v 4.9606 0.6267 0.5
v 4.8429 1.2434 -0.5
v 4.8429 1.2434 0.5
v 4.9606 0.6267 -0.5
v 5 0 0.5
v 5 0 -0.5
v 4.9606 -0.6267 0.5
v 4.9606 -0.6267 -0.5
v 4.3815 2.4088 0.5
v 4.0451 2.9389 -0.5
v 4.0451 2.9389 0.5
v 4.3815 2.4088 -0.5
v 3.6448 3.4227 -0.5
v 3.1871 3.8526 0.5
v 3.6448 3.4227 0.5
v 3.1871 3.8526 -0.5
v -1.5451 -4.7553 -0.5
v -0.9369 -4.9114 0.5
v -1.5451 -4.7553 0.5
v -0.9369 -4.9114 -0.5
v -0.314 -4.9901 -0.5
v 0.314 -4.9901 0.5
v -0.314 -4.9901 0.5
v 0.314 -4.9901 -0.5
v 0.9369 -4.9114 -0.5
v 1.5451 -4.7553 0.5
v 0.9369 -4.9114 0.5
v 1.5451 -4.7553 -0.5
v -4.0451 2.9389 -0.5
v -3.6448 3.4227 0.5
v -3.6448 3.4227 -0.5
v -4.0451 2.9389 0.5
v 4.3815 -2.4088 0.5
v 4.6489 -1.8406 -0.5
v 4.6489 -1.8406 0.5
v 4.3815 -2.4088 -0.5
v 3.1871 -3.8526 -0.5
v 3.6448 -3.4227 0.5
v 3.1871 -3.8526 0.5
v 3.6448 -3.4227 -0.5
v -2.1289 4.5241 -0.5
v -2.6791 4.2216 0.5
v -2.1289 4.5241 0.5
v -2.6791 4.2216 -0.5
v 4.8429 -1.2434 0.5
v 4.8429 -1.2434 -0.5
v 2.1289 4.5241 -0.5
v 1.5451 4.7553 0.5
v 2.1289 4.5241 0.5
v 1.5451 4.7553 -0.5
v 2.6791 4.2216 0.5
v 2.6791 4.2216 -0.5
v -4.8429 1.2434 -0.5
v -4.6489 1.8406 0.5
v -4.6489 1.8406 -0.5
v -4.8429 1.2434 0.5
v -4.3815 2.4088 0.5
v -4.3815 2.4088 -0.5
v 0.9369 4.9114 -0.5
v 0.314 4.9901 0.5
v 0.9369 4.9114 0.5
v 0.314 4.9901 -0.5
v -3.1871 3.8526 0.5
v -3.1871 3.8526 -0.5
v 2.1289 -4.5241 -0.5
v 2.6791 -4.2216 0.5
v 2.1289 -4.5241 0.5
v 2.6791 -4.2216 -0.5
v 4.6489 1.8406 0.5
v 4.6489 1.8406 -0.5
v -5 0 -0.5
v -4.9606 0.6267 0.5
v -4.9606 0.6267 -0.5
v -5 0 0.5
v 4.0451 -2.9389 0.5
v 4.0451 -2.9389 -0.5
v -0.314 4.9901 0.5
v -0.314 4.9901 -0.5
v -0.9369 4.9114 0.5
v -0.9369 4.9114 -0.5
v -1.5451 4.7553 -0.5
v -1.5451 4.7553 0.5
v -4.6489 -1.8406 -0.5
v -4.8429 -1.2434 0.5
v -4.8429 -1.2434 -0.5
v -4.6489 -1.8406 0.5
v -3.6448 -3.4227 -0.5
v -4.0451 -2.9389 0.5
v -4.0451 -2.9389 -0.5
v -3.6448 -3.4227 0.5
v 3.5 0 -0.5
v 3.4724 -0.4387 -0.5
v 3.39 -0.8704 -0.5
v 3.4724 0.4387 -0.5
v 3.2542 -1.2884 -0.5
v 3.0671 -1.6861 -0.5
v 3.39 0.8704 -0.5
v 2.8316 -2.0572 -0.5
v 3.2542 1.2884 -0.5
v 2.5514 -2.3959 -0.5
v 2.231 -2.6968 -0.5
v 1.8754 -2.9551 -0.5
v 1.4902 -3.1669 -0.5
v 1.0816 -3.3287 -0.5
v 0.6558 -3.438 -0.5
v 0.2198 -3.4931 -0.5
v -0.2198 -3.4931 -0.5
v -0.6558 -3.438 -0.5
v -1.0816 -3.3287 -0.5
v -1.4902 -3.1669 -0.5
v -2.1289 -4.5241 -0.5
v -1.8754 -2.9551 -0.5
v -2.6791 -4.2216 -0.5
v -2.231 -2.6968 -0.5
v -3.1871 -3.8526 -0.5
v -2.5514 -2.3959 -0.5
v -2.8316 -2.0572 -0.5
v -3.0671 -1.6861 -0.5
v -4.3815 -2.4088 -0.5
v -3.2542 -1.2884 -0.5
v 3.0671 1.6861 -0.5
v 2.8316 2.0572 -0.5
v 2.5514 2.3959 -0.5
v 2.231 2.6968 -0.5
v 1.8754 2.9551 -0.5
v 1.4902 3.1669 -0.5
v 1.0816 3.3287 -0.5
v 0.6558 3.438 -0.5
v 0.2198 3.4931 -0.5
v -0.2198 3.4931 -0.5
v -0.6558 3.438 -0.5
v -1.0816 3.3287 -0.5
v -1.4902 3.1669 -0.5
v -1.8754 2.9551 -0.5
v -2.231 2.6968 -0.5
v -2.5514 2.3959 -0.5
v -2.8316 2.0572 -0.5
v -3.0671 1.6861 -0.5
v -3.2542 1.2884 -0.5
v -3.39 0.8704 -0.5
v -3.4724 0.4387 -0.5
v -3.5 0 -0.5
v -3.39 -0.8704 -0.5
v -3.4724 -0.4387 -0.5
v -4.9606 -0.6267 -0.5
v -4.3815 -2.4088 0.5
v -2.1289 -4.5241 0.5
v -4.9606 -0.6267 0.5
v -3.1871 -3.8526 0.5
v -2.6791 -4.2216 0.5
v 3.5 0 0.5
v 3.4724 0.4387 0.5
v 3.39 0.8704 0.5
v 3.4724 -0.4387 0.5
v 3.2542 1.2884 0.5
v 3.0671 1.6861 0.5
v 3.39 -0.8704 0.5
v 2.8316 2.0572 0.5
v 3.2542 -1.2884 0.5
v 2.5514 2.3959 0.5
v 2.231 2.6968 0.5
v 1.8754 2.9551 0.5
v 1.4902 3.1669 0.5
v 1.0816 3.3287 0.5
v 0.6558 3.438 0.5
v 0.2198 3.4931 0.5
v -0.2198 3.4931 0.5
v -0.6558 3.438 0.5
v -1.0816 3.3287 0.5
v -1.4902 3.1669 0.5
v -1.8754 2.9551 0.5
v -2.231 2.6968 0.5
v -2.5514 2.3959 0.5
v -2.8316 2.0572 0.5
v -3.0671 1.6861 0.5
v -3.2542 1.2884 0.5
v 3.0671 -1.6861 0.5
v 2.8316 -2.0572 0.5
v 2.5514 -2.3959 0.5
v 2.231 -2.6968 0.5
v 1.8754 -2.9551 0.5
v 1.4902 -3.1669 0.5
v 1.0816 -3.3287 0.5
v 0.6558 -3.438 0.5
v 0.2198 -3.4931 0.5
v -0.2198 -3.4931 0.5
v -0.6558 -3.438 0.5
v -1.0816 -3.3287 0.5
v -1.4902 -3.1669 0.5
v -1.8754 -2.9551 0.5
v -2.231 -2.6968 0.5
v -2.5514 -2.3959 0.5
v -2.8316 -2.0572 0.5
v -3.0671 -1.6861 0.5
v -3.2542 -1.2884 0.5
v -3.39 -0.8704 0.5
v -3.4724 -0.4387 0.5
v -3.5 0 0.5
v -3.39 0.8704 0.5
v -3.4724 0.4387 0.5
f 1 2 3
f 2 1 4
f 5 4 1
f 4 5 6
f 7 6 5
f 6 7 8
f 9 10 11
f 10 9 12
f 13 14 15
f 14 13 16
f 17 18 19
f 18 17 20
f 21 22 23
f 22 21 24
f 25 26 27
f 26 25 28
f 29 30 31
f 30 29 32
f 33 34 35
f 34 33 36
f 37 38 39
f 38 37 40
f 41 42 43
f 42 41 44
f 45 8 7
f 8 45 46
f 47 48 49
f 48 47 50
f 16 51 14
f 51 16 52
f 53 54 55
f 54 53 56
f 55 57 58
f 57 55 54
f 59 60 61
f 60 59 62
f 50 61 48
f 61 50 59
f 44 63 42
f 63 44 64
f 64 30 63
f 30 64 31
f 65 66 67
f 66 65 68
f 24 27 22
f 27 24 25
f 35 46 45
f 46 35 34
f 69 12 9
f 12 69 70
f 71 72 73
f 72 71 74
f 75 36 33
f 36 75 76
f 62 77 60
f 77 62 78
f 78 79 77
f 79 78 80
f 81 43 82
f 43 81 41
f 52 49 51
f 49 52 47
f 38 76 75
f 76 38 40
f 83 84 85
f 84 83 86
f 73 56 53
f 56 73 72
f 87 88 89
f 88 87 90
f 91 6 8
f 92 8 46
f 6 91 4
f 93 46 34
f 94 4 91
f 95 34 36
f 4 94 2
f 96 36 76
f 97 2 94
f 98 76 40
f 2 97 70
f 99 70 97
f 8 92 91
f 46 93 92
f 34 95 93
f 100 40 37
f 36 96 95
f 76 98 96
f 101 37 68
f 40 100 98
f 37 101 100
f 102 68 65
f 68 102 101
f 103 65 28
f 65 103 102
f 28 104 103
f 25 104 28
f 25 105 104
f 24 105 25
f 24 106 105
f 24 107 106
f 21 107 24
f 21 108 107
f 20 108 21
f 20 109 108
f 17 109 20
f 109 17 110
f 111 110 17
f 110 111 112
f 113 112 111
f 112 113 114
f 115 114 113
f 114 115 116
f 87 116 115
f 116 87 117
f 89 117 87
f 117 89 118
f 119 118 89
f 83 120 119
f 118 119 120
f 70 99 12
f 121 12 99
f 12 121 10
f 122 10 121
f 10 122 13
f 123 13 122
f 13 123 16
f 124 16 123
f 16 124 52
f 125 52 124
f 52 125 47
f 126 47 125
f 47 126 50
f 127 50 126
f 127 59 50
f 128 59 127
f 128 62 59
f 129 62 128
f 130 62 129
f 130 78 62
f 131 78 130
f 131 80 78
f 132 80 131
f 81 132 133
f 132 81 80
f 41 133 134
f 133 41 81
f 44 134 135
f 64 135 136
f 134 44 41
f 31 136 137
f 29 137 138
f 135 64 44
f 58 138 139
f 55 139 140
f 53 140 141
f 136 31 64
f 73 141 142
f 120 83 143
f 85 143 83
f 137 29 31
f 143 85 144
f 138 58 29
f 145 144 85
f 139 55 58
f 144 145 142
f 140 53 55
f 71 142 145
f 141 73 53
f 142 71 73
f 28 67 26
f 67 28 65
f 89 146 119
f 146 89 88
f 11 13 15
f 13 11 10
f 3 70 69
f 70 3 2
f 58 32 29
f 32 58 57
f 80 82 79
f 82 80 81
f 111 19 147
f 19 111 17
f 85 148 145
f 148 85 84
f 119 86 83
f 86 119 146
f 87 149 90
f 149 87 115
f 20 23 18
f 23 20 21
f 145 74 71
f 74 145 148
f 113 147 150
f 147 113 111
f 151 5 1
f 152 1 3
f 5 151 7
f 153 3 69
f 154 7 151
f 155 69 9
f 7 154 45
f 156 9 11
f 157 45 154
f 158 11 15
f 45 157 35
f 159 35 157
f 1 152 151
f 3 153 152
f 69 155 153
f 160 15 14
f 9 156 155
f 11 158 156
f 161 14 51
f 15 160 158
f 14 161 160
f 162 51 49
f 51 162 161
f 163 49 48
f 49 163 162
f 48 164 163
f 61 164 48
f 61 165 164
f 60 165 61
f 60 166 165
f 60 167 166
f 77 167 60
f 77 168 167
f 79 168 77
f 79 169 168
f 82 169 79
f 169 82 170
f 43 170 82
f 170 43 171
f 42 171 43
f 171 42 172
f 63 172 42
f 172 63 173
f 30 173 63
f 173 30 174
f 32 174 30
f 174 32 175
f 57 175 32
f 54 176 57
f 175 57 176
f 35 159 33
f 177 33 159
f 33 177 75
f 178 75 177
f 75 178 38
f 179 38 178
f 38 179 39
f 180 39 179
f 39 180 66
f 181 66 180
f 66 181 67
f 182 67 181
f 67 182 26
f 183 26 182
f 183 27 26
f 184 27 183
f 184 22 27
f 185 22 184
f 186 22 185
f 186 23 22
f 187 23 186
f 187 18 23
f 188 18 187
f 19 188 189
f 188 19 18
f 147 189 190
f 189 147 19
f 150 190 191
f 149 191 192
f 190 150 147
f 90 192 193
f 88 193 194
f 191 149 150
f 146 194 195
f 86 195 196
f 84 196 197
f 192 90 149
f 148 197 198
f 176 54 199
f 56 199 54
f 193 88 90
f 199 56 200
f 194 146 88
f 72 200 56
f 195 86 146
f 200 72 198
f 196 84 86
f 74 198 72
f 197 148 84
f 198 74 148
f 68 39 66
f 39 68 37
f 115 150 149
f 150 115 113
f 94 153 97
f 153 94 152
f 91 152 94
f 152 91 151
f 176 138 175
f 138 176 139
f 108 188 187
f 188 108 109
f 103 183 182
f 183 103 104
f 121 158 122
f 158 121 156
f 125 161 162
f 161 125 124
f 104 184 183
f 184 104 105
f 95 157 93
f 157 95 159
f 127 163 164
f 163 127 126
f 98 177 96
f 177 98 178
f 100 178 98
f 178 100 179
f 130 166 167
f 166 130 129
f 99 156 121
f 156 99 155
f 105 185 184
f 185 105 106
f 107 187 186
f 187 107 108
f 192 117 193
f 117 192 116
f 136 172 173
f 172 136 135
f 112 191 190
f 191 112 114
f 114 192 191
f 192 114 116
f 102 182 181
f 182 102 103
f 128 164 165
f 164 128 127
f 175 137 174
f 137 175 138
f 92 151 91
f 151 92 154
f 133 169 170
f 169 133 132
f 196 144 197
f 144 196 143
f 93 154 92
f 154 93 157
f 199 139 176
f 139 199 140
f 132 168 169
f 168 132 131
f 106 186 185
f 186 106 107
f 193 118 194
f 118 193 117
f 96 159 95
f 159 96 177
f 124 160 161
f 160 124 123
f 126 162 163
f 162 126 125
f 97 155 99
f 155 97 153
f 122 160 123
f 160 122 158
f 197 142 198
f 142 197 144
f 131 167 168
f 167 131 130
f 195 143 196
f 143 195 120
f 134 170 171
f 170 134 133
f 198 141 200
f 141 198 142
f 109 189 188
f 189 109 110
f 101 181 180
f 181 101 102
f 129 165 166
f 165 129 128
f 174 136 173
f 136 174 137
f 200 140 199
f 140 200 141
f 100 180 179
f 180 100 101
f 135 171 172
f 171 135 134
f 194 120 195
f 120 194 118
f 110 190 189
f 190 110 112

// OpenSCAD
$fn = 50;


difference() {
	union() {
		translate(v = [0, 0, -0.5000000000]) {
			cylinder(h = 1, r = 5.0000000000);
		}
	}
	union() {
		translate(v = [0, 0, -100.0000000000]) {
			cylinder(h = 200, r = 3.5000000000);
		}
	}
}
